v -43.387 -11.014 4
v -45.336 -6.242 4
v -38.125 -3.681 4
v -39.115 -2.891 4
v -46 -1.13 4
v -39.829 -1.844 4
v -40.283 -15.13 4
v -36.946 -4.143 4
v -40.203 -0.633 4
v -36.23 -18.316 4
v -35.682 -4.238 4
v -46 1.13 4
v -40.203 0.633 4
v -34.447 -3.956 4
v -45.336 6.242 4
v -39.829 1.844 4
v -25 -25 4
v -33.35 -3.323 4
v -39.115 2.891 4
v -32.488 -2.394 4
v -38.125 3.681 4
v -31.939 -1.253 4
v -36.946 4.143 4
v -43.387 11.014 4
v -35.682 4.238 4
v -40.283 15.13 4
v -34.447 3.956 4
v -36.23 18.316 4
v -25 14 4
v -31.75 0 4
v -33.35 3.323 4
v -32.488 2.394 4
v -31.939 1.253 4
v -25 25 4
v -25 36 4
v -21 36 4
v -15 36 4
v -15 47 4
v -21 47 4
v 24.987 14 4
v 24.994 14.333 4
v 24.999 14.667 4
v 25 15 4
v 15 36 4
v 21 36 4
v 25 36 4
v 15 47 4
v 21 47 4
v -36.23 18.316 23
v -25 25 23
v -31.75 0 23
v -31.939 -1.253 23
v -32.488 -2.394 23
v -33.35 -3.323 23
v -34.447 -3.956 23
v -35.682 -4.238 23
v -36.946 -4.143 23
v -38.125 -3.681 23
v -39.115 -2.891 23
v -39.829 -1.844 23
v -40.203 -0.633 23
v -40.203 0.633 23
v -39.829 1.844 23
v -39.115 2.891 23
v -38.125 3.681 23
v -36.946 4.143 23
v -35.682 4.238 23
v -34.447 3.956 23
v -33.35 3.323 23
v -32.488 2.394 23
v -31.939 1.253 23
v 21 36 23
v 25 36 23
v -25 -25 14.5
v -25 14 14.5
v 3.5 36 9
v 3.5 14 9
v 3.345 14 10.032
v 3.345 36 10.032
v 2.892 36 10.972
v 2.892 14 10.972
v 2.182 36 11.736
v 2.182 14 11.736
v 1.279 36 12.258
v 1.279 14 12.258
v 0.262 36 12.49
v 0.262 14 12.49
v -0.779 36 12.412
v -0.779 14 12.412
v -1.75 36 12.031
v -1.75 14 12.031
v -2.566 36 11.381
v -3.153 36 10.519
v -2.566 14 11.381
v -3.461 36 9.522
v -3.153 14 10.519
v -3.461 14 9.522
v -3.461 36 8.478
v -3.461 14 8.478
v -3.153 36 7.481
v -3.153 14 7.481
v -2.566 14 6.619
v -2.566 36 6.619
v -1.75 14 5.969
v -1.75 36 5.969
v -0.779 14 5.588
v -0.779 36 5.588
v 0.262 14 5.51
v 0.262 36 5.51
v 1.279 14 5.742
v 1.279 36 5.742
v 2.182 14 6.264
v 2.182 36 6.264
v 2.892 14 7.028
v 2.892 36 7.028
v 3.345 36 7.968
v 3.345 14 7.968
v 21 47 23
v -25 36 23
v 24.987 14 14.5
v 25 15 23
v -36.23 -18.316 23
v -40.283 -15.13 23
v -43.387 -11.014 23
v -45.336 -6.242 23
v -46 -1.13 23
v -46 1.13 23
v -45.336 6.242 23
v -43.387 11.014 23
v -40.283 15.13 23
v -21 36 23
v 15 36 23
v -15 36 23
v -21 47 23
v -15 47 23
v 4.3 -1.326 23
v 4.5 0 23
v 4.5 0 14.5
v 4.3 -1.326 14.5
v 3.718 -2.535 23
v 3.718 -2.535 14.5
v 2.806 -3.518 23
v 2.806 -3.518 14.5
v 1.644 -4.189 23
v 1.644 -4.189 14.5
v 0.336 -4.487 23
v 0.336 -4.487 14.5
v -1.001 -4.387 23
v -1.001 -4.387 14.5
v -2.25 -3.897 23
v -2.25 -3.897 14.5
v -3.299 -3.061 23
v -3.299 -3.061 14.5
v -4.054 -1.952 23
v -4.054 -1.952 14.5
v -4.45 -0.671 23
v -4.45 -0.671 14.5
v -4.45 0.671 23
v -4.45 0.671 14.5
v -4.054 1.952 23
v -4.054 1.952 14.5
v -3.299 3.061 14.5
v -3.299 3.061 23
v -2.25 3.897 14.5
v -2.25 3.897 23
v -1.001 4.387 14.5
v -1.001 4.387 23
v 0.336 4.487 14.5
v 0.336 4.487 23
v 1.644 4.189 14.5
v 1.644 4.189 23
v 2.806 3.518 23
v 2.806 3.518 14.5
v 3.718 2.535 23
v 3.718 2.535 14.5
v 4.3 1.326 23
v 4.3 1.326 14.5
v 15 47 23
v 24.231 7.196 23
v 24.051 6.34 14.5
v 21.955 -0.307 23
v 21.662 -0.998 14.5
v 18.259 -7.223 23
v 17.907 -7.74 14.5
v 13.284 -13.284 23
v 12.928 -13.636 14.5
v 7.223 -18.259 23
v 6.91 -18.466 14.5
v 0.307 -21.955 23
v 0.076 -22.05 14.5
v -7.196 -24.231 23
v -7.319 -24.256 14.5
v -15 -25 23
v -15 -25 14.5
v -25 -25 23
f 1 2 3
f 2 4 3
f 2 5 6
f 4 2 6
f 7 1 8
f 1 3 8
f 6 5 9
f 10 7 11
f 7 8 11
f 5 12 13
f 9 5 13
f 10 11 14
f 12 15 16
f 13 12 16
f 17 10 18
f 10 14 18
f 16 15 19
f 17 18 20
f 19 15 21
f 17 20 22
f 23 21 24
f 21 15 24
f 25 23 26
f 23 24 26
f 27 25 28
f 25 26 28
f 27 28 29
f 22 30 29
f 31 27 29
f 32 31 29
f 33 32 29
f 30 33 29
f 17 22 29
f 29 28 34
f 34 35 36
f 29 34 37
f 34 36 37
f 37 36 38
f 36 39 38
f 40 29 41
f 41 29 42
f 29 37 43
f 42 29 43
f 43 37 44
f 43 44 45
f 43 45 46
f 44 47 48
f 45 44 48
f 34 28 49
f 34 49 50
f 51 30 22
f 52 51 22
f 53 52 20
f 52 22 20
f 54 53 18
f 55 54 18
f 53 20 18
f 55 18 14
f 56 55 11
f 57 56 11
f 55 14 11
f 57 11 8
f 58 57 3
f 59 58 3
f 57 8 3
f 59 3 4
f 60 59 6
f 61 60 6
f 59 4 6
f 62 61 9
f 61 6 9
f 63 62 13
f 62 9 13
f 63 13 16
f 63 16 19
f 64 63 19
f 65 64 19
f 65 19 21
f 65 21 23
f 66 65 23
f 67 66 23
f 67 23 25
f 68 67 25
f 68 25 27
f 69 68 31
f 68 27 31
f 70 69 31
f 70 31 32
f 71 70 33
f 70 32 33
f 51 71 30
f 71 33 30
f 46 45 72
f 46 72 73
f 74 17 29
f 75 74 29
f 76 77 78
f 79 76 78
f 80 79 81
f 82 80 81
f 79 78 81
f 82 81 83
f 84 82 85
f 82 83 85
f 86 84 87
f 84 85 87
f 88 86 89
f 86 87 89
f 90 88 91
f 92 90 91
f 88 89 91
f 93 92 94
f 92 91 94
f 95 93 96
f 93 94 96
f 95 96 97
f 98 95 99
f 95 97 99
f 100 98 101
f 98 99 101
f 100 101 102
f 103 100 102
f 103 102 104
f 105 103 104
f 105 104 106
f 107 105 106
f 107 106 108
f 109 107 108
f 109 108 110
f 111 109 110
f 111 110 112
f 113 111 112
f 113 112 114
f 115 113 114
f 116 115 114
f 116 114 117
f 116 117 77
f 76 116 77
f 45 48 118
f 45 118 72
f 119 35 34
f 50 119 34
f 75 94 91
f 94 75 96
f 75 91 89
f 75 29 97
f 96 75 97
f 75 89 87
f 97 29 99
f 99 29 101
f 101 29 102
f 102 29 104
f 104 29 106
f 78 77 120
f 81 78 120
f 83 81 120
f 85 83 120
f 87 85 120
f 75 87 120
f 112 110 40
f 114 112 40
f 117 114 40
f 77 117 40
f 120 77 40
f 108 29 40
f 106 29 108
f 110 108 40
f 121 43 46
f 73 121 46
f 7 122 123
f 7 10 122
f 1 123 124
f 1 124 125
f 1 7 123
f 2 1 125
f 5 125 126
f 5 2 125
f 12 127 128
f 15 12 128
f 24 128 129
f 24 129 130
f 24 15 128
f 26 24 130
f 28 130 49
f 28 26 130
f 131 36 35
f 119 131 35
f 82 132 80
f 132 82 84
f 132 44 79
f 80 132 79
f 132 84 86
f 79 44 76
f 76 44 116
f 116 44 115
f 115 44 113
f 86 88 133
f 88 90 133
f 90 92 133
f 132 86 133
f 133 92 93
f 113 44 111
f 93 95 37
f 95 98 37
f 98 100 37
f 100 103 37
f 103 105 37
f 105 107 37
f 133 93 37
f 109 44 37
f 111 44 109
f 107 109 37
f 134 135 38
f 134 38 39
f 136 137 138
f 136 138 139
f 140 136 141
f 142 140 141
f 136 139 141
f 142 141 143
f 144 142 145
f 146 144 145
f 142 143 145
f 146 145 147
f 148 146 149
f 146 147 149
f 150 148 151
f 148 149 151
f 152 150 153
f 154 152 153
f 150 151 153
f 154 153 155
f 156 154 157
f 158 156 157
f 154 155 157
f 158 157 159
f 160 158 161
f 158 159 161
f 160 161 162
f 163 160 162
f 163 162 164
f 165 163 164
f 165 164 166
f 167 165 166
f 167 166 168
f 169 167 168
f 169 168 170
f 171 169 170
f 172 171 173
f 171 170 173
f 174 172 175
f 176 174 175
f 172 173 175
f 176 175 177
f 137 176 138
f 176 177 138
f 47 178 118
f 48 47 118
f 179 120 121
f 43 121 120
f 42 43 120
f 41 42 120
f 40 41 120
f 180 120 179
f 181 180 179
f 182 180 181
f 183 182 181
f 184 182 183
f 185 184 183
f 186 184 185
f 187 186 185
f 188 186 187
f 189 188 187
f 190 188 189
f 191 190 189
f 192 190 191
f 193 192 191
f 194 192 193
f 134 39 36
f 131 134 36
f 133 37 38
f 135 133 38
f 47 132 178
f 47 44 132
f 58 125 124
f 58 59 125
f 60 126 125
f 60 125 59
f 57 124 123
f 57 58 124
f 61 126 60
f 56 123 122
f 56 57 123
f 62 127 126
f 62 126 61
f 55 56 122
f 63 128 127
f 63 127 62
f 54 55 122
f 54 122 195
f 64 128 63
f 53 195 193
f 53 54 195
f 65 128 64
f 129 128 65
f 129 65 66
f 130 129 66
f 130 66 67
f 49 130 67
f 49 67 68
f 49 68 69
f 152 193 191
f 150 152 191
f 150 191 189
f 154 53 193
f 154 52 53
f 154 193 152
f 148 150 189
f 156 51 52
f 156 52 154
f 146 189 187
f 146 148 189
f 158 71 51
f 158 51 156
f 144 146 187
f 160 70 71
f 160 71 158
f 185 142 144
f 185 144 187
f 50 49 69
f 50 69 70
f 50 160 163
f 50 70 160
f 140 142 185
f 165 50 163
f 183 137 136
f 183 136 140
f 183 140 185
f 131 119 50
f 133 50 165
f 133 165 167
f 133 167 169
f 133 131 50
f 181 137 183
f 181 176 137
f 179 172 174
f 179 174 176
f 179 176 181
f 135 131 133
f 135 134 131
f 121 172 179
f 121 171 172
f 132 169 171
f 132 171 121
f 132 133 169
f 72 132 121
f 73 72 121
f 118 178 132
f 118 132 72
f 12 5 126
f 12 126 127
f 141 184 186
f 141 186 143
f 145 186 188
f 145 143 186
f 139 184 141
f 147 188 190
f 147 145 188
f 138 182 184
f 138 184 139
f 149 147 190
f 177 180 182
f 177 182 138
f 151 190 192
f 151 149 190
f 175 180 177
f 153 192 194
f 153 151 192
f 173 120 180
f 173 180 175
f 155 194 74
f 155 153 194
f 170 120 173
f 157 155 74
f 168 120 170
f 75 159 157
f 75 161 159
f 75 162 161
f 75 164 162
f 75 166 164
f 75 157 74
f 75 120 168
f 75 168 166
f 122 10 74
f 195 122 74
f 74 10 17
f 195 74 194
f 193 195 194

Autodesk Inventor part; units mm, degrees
ref_plane "YZ Plane" through (0, 0, 0) normal (1, 0, 0) x (0, 1, 0)
ref_plane "XZ Plane" through (0, 0, 0) normal (0, 1, 0) x (-1, 0, 0)
ref_plane "XY Plane" through (0, 0, 0) normal (0, 0, 1) x (1, 0, 0)
sketch "Sketch1" plane through (0, 0, 0) normal (0, 0, 1) x (1, 0, 0)
  line L0 (-21, -21) -> (21, -21)
  line L1 (21, -21) -> (21, 21)
  line L2 (21, 21) -> (-21, 21)
  line L3 (-21, 21) -> (-21, -21)
  line L4 (-21, -21) -> (21, 21) construction
  line L5 (21, -21) -> (-21, 21) construction
  circle A0 centre (0, 0) radius 4.5
  circle A1 centre (-36, 0) radius 4.25
  line L6 (-46, 0) -> (-46, 12.5)
  line L7 (-46, 0) -> (-46, -12.5)
  line L8 (-25, -25) -> (25, -25)
  line L9 (25, -25) -> (25, 25)
  line L10 (-25, -25) -> (25, 25) construction
  line L11 (25, -25) -> (-25, 25) construction
  line L12 (-46, 12.5) -> (-25, 25)
  line L13 (-46, -12.5) -> (-25, -25)
  line L14 (0, 36) -> (15, 36)
  line L15 (15, 36) -> (15, 47)
  line L16 (15, 47) -> (21, 47)
  line L17 (21, 47) -> (21, 36)
  line L18 (21, 36) -> (25, 36)
  line L19 (25, 36) -> (25, 25)
  line L20 (0, 36) -> (-15, 36)
  line L21 (-15, 36) -> (-15, 47)
  line L22 (-15, 47) -> (-21, 47)
  line L23 (-21, 47) -> (-21, 36)
  line L24 (-21, 36) -> (-25, 36)
  line L25 (-25, 36) -> (-25, 25)
  line L26 (-25, 25) -> (25, 25)
  dimension "d0" = 42
  dimension "d1" = 42
  dimension "d2" = 9
  dimension "d5" = 8.5
  dimension "d6" = 46
  dimension "d10" = 50
  dimension "d12" = 15
  dimension "d14" = 6
  dimension "d15" = 11
  dimension "d21" = 11
  dimension "d22" = 50
  dimension "d23" = 25
  dimension "d24" = 4
extrude "Extrusion1" add sketch "Sketch1" along normal blind 15 contours L3 L2 L1 L0 | L6 L12 L26 L9 L8 L13 L7 | L25 L24 L23 L22 L21 L20 L14 L15 L16 L17 L18 L19 L26
move faces "Move1" translate (0, 0, 10) faces at (0.1808, -18.1557, 15)
sketch "Sketch2" plane through (-25, -25, 25) normal (0, 0, 1) x (1, 0, 0)
  line L0 (0, 5) -> (50, 45) construction
  line L1 (50, 5) -> (0, 45) construction
  line L2 (50, 0) -> (50, 61) projected
  line L3 (50, 0) -> (0, 0)
  line L4 (0, 0) -> (0, 40)
  line L5 (0, 40) -> (50, 40)
  line L6 (50, 40) -> (50, 0)
  point P0 (25, 25)
  dimension "d32" = 50
  dimension "d33" = 40
sketch "Sketch3" plane through (-25, -25, 25) normal (0, 0, 1) x (1, 0, 0)
  line L0 (50, 0) -> (50, 61) projected
  line L1 (50, 0) -> (0, 0)
  line L2 (0, 0) -> (0, 38)
  line L3 (0, 38) -> (50, 38)
  line L4 (50, 38) -> (50, 0)
  point P0 (25, 25)
  dimension "d34" = 50
  dimension "d35" = 38
move faces "Move2" translate (0, 0, -2) faces at (18.1231, 4.0256, 25)
move faces "Move3" translate (0, 0, 4) faces at (18.1231, 4.0256, 0)
sketch "Sketch5" plane through (25, -25, 4) normal (0, 0, -1) x (-1, 0, 0)
  line L0 (0, 0) -> (0, 61) projected
  line L1 (0, 0) -> (50, 0)
  line L2 (50, 0) -> (50, 39)
  line L3 (50, 39) -> (0, 39)
  line L4 (0, 39) -> (0, 0)
  point P0 (25, 25)
  point P1 (0, 39)
  dimension "d48" = 50
  dimension "d49" = 39
extrude "Extrusion4" cut sketch "Sketch5" against normal blind 10
sketch "Sketch6" plane through (-25, 14, 4) normal (0, -1, 0) x (1, 0, 0)
  circle A0 centre (25, 5) radius 3.5
  line L0 (50, 0) -> (0, 0) projected
  point P0 (25, -4)
  dimension "d52" = 7
  dimension "d53" = 5
move faces "Move4" translate (0, 0, 0.5) faces at (0.1808, -18.1557, 14)
extrude "Extrusion5" cut sketch "Sketch6" against normal blind 30
fillet "Fillet1" radius 40 1 edges at (25, -25, 18.75)
fillet "Fillet2" radius 20 1 edges at (-46, -12.5, 13.5)
fillet "Fillet3" radius 20 1 edges at (-46, 12.5, 13.5)
properties part number "SuporteInferior"
